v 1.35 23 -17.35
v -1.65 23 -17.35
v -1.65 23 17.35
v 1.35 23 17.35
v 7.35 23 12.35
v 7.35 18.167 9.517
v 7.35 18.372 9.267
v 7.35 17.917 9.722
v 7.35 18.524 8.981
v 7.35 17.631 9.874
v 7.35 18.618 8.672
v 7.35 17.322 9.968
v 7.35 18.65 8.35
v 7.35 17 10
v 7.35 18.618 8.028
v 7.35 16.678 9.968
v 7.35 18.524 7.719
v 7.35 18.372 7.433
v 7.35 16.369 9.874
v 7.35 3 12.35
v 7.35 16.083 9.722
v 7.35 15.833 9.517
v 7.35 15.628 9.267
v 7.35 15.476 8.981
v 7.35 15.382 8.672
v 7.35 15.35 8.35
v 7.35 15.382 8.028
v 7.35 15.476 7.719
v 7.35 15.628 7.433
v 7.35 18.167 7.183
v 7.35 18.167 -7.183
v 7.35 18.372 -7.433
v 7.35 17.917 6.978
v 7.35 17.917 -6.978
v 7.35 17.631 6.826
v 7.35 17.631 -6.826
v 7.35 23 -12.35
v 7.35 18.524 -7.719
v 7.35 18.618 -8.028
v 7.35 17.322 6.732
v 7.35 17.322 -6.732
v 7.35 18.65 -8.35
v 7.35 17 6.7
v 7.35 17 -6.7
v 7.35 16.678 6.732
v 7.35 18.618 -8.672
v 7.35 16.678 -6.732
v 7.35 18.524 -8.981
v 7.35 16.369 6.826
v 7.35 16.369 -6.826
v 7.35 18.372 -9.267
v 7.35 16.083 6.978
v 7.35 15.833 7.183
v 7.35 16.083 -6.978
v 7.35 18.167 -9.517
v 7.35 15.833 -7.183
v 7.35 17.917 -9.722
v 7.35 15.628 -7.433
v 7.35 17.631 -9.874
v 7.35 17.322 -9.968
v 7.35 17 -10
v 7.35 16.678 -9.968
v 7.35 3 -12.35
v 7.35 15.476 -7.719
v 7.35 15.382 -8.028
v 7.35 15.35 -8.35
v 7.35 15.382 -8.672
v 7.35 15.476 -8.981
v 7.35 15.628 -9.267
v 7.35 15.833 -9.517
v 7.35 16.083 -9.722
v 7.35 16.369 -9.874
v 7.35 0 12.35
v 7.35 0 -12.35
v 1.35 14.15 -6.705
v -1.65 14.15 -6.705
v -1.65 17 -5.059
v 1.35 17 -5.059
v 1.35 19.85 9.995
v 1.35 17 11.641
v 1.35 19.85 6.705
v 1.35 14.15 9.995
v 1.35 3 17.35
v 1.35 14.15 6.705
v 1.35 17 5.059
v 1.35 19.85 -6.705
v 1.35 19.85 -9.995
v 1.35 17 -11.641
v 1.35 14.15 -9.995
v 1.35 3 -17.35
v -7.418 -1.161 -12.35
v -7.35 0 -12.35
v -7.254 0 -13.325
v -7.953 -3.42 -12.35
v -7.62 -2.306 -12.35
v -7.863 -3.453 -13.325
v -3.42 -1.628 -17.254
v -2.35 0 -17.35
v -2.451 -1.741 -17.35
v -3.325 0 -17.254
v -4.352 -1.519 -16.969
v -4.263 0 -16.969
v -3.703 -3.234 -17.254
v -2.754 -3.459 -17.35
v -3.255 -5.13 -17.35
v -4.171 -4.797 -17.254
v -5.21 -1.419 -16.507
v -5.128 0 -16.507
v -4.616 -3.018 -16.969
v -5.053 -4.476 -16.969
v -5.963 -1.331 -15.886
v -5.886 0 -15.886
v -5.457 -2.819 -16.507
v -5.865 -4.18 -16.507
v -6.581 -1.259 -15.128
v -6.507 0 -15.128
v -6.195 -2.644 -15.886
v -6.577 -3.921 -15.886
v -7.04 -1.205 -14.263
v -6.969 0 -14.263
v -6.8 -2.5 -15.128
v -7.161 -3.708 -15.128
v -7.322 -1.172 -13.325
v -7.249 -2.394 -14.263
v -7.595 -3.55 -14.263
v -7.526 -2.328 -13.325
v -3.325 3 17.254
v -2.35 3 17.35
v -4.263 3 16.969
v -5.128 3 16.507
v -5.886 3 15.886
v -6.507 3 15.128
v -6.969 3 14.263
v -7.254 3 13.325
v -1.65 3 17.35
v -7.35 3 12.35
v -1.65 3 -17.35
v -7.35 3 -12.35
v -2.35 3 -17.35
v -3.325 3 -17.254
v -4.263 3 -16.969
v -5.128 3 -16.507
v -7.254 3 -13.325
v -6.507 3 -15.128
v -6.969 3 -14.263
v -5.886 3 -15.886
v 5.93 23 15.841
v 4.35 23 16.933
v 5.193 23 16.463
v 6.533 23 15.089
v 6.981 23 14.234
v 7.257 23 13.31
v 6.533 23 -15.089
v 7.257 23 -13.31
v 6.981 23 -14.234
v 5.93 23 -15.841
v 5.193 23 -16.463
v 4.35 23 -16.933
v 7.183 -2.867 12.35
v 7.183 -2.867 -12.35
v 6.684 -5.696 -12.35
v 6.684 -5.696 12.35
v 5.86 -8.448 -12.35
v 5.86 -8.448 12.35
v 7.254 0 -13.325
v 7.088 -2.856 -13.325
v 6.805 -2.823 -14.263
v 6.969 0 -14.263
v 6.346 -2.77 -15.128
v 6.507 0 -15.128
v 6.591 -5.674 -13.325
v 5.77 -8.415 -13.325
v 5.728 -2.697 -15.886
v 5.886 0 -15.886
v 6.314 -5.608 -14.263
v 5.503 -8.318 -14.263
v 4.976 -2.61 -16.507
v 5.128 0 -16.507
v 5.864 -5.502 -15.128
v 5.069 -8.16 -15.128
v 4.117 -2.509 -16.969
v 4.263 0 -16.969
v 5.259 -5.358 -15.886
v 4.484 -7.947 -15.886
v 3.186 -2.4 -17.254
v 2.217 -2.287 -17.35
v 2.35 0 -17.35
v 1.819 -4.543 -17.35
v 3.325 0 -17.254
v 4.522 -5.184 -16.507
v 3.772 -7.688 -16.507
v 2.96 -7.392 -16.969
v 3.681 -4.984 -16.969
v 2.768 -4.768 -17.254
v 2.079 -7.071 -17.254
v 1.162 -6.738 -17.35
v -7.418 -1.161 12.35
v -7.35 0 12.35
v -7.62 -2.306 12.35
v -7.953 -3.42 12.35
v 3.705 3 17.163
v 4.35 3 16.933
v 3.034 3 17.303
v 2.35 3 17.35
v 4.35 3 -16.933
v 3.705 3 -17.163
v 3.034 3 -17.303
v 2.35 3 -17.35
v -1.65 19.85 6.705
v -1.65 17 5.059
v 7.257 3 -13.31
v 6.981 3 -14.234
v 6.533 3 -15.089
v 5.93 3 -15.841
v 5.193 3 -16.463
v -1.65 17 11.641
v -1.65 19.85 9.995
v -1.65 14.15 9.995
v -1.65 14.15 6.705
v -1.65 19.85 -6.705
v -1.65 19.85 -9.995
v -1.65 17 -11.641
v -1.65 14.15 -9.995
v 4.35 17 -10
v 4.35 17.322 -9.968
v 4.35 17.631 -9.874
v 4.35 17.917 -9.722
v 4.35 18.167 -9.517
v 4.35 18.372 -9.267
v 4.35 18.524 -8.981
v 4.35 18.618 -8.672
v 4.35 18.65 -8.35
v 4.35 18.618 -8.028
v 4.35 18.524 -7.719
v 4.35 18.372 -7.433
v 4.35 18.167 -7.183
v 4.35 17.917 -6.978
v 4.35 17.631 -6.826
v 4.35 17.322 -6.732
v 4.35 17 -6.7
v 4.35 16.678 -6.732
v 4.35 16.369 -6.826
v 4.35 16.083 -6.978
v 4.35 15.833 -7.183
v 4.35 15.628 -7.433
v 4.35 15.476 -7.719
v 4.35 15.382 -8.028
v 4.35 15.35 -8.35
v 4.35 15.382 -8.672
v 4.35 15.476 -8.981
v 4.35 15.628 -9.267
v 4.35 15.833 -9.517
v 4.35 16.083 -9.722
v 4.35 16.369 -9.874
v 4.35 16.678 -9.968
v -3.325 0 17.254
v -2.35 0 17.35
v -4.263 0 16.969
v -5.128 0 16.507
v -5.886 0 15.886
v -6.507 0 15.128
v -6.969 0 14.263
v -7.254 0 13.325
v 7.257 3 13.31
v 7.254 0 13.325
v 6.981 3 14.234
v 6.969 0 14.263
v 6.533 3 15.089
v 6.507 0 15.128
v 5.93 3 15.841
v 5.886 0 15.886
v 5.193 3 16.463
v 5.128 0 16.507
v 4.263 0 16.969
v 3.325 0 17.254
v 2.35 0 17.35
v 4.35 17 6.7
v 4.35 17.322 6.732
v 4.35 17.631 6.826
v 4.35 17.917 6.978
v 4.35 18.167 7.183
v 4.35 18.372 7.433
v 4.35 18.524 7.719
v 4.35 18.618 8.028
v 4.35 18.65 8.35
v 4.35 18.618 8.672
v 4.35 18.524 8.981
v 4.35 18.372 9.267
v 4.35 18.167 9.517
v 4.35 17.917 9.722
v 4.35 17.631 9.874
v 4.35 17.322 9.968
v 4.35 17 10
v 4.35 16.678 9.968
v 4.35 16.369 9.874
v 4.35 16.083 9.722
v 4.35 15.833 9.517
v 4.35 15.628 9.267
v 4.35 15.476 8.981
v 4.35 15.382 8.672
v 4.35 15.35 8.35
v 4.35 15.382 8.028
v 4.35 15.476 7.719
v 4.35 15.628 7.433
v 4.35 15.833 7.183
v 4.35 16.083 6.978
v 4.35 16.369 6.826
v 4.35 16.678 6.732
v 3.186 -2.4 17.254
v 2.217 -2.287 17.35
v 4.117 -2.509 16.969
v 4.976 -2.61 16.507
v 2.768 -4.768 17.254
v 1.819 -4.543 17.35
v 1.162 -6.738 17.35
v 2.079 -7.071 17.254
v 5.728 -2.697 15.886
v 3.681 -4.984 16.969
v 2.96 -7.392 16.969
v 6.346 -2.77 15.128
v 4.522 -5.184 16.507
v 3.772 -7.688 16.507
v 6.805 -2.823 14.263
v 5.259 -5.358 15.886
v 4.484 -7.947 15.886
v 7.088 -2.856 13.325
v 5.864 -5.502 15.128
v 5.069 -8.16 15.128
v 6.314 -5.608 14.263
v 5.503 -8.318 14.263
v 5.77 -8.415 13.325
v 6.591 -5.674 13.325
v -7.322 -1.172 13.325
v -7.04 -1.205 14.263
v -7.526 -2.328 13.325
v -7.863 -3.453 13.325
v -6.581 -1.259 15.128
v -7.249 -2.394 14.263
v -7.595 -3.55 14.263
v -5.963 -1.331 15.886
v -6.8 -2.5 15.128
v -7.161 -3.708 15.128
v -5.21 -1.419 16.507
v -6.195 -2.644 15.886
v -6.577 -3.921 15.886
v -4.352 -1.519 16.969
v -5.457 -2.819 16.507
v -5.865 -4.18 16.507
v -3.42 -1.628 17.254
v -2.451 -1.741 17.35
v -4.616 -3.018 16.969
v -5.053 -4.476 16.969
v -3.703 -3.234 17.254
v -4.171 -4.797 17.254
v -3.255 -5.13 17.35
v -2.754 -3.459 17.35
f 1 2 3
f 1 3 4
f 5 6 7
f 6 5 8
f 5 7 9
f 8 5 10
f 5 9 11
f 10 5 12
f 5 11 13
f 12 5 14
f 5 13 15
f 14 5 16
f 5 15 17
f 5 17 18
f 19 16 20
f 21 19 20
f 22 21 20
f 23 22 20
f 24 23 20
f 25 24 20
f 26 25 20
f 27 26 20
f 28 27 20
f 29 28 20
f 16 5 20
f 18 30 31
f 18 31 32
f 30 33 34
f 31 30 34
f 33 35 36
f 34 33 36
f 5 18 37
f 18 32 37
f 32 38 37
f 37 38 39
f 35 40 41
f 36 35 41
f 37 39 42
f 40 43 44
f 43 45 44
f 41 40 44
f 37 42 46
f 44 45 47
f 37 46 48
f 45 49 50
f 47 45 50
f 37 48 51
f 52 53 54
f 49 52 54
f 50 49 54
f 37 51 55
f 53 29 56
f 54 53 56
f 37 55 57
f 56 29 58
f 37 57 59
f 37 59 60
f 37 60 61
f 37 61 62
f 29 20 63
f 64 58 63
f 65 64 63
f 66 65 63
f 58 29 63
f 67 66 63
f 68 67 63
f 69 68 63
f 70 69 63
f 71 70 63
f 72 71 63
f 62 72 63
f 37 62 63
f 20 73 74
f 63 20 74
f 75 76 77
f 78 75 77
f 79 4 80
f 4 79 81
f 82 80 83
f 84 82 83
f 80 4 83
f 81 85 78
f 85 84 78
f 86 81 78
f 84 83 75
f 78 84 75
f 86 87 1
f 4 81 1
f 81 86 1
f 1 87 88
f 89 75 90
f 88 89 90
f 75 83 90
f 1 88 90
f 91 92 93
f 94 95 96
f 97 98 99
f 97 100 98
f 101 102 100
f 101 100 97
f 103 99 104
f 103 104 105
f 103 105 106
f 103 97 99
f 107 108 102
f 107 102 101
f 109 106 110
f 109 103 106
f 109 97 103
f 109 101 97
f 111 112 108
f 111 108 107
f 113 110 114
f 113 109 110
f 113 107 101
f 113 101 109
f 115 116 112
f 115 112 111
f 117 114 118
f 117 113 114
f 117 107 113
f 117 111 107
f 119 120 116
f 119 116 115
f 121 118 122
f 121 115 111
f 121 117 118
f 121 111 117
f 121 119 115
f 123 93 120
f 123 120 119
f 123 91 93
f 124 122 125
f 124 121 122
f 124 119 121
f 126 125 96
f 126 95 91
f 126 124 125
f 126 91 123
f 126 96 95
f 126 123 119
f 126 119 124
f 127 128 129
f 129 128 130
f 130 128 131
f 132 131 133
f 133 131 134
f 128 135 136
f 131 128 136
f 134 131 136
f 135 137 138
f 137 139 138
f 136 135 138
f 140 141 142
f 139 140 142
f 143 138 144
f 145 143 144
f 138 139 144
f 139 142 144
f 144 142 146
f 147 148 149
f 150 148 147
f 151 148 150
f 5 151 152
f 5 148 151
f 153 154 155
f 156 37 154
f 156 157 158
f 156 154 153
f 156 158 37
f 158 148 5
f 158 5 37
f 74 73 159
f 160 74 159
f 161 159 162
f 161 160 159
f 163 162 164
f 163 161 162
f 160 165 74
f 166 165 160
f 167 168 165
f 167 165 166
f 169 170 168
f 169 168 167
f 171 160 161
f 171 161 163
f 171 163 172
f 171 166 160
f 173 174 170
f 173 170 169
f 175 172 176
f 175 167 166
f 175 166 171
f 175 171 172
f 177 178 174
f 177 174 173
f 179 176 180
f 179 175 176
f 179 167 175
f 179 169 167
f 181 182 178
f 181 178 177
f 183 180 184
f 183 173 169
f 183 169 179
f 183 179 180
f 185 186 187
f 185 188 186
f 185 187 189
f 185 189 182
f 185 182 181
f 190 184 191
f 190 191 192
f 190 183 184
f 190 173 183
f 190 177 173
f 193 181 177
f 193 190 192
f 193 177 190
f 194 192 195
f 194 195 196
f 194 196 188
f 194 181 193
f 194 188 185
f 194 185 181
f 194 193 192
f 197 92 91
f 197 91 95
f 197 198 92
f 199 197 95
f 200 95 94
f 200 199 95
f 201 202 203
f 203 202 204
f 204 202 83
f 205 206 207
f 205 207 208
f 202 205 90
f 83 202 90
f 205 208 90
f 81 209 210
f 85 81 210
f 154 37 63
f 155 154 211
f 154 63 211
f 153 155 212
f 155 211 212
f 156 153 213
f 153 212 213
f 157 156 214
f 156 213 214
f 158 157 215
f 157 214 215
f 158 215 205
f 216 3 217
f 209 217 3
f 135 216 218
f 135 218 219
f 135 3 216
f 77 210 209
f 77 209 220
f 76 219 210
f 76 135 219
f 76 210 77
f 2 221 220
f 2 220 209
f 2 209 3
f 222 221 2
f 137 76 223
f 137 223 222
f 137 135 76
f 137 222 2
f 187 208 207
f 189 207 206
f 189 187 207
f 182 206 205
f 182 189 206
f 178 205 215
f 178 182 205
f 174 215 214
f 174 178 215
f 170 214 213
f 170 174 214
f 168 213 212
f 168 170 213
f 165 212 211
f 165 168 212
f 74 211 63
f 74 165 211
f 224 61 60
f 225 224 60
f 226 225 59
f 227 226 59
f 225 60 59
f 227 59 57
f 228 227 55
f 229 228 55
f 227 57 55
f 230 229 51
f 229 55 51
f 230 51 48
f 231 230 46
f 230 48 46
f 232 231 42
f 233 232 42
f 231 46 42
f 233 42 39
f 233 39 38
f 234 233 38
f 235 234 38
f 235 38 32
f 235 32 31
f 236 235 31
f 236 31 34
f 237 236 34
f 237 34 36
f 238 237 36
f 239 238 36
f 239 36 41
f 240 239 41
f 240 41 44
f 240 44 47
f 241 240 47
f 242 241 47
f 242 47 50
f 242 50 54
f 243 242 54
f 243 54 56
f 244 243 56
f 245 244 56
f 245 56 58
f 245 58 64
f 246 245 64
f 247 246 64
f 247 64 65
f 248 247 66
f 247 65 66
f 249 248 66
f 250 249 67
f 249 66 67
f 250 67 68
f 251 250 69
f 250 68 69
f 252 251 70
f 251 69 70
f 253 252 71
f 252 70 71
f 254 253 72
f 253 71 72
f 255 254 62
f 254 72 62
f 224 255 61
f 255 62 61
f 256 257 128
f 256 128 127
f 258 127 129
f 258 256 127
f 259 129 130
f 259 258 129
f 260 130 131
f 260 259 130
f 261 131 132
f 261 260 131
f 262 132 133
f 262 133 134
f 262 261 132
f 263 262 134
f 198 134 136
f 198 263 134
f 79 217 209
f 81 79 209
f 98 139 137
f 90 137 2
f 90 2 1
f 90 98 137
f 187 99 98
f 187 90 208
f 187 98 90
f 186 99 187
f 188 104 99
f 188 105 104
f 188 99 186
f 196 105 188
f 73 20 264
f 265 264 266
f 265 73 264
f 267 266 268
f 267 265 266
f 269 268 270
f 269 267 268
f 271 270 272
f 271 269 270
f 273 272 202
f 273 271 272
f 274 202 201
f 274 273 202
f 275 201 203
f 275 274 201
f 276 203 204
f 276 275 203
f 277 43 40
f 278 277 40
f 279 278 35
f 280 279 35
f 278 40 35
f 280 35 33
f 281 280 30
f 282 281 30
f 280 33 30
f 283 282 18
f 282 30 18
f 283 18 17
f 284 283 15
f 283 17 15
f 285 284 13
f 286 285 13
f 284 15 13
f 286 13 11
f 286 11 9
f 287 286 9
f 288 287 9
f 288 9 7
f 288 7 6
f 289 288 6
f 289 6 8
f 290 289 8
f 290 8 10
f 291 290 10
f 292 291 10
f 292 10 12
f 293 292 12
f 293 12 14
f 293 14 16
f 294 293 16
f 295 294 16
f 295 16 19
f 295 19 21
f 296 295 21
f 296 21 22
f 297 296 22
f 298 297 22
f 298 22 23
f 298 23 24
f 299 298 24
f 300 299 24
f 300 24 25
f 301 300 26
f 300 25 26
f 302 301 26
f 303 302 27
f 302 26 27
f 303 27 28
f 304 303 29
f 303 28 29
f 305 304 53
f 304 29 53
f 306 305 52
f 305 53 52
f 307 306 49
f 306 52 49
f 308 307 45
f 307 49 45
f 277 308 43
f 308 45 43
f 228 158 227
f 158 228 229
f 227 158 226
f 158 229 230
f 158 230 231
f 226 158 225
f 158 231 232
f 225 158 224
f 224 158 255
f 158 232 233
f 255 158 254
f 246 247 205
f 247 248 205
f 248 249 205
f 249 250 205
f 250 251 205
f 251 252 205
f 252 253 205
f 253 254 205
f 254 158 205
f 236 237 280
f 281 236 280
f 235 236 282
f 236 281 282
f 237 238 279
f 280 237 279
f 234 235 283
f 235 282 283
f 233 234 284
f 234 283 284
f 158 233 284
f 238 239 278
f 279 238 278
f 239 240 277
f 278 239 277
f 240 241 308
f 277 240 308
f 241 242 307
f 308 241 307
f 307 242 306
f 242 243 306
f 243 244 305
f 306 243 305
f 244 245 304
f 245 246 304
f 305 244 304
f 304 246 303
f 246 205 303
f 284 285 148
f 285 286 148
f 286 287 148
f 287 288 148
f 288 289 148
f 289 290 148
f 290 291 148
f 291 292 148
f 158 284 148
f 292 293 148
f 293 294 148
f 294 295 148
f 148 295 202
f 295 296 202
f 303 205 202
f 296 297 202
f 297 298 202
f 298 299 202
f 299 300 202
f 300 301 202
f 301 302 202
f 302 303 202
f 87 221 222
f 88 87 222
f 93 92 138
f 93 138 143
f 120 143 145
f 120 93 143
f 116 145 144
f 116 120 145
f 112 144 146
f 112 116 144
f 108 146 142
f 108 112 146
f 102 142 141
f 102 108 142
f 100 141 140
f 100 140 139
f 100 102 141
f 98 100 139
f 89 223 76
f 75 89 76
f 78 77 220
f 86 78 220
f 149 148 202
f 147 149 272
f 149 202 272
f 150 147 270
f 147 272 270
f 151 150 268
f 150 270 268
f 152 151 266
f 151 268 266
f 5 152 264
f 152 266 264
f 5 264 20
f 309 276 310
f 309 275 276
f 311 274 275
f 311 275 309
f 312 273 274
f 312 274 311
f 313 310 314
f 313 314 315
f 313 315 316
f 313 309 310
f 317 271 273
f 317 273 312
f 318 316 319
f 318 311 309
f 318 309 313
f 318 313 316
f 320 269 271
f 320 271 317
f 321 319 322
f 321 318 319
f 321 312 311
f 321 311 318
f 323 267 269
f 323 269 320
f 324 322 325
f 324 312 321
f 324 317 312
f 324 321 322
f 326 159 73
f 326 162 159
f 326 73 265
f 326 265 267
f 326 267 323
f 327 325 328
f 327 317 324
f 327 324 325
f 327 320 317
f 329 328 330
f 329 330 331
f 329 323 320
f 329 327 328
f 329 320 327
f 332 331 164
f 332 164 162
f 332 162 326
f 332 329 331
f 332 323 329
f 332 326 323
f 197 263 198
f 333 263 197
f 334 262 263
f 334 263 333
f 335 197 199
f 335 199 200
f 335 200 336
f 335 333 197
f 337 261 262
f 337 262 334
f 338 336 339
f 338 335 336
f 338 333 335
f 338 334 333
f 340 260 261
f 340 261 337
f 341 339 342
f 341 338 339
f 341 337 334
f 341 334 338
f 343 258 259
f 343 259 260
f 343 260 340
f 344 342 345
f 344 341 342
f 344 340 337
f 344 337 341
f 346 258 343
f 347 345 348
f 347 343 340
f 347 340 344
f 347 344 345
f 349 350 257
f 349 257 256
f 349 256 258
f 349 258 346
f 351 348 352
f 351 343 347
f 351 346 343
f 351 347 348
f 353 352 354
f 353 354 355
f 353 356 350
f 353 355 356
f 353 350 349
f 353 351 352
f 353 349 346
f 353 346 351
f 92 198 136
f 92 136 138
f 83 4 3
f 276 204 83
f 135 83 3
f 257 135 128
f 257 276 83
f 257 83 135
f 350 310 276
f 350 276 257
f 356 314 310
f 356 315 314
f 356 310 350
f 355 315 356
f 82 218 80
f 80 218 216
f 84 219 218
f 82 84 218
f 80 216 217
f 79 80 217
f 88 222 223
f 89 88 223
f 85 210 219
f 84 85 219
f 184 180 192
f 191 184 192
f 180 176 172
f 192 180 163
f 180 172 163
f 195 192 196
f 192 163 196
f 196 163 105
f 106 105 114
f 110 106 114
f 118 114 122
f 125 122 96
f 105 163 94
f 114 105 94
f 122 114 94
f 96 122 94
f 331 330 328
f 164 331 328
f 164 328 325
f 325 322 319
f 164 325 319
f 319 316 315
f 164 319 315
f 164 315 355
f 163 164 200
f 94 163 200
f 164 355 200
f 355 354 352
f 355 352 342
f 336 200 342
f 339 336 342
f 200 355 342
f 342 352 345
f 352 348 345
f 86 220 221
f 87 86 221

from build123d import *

# Parameters (mm, degrees)
BOSS_EXTRU_1_DEPTH      = 3
R_VOLUTION1_ANGLE       = 20
ESQUISSE5_W             = 3
ESQUISSE5_H             = 34.7
BOSS_EXTRU_2_DEPTH      = 20
ESQUISSE6_R             = 1.65
ENL_V_MAT_EXTRU_1_DEPTH = 16.303073792
ENL_V_MAT_EXTRU_3_REACH = 11


with BuildPart() as part:
    # Esquisse1 → Boss.-Extru.1 (new body)
    with BuildSketch(Plane(origin=(0, 0, 0), x_dir=(1, 0, 0), z_dir=(0, 1, 0))):
        with BuildLine():
            Line((2.35, -17.35), (-2.35, -17.35))
            ThreePointArc((-2.35, -17.35), (-5.885533906, -15.885533906), (-7.35, -12.35))
            Line((-7.35, -12.35), (-7.35, 12.35))
            ThreePointArc((-7.35, 12.35), (-5.885533906, 15.885533906), (-2.35, 17.35))
            Line((-2.35, 17.35), (2.35, 17.35))
            ThreePointArc((2.35, 17.35), (5.885533906, 15.885533906), (7.35, 12.35))
            Line((7.35, 12.35), (7.35, -12.35))
            ThreePointArc((7.35, -12.35), (5.885533906, -15.885533906), (2.35, -17.35))
        make_face()
    extrude(amount=BOSS_EXTRU_1_DEPTH)

    # Esquisse4 → Révolution1 (revolve)
    with BuildSketch(Plane.XZ):
        with BuildLine():
            Line((2.35, -17.35), (-2.35, -17.35))
            ThreePointArc((-2.35, -17.35), (-5.885533906, -15.885533906), (-7.35, -12.35))
            Line((-7.35, -12.35), (-7.35, 12.35))
            ThreePointArc((-7.35, 12.35), (-5.885533906, 15.885533906), (-2.35, 17.35))
            Line((-2.35, 17.35), (2.35, 17.35))
            ThreePointArc((2.35, 17.35), (5.885533906, 15.885533906), (7.35, 12.35))
            Line((7.35, 12.35), (7.35, -12.35))
            ThreePointArc((7.35, -12.35), (5.885533906, -15.885533906), (2.35, -17.35))
        make_face()
    revolve(axis=Axis((-17.35, 0, 12.35), (0, 0, -1)), revolution_arc=R_VOLUTION1_ANGLE)

    # Esquisse5 → Boss.-Extru.2 (add)
    with BuildSketch(Plane(origin=(0, 3, 0), x_dir=(1, 0, 0), z_dir=(0, 1, 0))):
        with Locations((-0.15, 0)):
            Rectangle(ESQUISSE5_W, ESQUISSE5_H)
        with BuildLine():
            Line((7.35, -12.35), (7.35, 12.35))
            ThreePointArc((7.35, 12.35), (6.533300133, 15.088612788), (4.35, 16.932575695))
            Line((4.35, 16.932575695), (4.35, -16.932575695))
            ThreePointArc((4.35, -16.932575695), (6.533300133, -15.088612788), (7.35, -12.35))
        make_face()
    extrude(amount=BOSS_EXTRU_2_DEPTH)

    # Esquisse6 → Enlèv. mat.-Extru.1 (cut, through all)
    with BuildSketch(Plane(origin=(7.35, 0, 0), x_dir=(0, 0, -1), z_dir=(1, 0, 0))):
        with Locations((-8.35, 17)):
            Circle(ESQUISSE6_R)
        with Locations((8.35, 17)):
            Circle(ESQUISSE6_R)
    extrude(amount=-ENL_V_MAT_EXTRU_1_DEPTH, mode=Mode.SUBTRACT)

    # Esquisse8 → Enlèv. mat.-Extru.3 (cut, up to next)
    with BuildSketch(Plane.ZY.offset(1.65), mode=Mode.PRIVATE) as enl_v_mat_extru_3_sk1:
        Polygon((-6.704551733, 19.85), (-9.995448267, 19.85), (-11.640896534, 17), (-9.995448267, 14.15), (-6.704551733, 14.15), (-5.059103466, 17), align=None)
    enl_v_mat_extru_3_tool1 = extrude(enl_v_mat_extru_3_sk1.sketch, amount=-ENL_V_MAT_EXTRU_3_REACH, mode=Mode.PRIVATE) & part.part
    add(enl_v_mat_extru_3_tool1.solids().sort_by_distance((-1.65, 17, -8.35))[0], mode=Mode.SUBTRACT)
    # Esquisse8 → Enlèv. mat.-Extru.3 (cut, up to next)
    with BuildSketch(Plane.ZY.offset(1.65), mode=Mode.PRIVATE) as enl_v_mat_extru_3_sk2:
        Polygon((9.995448267, 19.85), (6.704551733, 19.85), (5.059103466, 17), (6.704551733, 14.15), (9.995448267, 14.15), (11.640896534, 17), align=None)
    enl_v_mat_extru_3_tool2 = extrude(enl_v_mat_extru_3_sk2.sketch, amount=-ENL_V_MAT_EXTRU_3_REACH, mode=Mode.PRIVATE) & part.part
    add(enl_v_mat_extru_3_tool2.solids().sort_by_distance((-1.65, 17, 8.35))[0], mode=Mode.SUBTRACT)


solid = part.part
